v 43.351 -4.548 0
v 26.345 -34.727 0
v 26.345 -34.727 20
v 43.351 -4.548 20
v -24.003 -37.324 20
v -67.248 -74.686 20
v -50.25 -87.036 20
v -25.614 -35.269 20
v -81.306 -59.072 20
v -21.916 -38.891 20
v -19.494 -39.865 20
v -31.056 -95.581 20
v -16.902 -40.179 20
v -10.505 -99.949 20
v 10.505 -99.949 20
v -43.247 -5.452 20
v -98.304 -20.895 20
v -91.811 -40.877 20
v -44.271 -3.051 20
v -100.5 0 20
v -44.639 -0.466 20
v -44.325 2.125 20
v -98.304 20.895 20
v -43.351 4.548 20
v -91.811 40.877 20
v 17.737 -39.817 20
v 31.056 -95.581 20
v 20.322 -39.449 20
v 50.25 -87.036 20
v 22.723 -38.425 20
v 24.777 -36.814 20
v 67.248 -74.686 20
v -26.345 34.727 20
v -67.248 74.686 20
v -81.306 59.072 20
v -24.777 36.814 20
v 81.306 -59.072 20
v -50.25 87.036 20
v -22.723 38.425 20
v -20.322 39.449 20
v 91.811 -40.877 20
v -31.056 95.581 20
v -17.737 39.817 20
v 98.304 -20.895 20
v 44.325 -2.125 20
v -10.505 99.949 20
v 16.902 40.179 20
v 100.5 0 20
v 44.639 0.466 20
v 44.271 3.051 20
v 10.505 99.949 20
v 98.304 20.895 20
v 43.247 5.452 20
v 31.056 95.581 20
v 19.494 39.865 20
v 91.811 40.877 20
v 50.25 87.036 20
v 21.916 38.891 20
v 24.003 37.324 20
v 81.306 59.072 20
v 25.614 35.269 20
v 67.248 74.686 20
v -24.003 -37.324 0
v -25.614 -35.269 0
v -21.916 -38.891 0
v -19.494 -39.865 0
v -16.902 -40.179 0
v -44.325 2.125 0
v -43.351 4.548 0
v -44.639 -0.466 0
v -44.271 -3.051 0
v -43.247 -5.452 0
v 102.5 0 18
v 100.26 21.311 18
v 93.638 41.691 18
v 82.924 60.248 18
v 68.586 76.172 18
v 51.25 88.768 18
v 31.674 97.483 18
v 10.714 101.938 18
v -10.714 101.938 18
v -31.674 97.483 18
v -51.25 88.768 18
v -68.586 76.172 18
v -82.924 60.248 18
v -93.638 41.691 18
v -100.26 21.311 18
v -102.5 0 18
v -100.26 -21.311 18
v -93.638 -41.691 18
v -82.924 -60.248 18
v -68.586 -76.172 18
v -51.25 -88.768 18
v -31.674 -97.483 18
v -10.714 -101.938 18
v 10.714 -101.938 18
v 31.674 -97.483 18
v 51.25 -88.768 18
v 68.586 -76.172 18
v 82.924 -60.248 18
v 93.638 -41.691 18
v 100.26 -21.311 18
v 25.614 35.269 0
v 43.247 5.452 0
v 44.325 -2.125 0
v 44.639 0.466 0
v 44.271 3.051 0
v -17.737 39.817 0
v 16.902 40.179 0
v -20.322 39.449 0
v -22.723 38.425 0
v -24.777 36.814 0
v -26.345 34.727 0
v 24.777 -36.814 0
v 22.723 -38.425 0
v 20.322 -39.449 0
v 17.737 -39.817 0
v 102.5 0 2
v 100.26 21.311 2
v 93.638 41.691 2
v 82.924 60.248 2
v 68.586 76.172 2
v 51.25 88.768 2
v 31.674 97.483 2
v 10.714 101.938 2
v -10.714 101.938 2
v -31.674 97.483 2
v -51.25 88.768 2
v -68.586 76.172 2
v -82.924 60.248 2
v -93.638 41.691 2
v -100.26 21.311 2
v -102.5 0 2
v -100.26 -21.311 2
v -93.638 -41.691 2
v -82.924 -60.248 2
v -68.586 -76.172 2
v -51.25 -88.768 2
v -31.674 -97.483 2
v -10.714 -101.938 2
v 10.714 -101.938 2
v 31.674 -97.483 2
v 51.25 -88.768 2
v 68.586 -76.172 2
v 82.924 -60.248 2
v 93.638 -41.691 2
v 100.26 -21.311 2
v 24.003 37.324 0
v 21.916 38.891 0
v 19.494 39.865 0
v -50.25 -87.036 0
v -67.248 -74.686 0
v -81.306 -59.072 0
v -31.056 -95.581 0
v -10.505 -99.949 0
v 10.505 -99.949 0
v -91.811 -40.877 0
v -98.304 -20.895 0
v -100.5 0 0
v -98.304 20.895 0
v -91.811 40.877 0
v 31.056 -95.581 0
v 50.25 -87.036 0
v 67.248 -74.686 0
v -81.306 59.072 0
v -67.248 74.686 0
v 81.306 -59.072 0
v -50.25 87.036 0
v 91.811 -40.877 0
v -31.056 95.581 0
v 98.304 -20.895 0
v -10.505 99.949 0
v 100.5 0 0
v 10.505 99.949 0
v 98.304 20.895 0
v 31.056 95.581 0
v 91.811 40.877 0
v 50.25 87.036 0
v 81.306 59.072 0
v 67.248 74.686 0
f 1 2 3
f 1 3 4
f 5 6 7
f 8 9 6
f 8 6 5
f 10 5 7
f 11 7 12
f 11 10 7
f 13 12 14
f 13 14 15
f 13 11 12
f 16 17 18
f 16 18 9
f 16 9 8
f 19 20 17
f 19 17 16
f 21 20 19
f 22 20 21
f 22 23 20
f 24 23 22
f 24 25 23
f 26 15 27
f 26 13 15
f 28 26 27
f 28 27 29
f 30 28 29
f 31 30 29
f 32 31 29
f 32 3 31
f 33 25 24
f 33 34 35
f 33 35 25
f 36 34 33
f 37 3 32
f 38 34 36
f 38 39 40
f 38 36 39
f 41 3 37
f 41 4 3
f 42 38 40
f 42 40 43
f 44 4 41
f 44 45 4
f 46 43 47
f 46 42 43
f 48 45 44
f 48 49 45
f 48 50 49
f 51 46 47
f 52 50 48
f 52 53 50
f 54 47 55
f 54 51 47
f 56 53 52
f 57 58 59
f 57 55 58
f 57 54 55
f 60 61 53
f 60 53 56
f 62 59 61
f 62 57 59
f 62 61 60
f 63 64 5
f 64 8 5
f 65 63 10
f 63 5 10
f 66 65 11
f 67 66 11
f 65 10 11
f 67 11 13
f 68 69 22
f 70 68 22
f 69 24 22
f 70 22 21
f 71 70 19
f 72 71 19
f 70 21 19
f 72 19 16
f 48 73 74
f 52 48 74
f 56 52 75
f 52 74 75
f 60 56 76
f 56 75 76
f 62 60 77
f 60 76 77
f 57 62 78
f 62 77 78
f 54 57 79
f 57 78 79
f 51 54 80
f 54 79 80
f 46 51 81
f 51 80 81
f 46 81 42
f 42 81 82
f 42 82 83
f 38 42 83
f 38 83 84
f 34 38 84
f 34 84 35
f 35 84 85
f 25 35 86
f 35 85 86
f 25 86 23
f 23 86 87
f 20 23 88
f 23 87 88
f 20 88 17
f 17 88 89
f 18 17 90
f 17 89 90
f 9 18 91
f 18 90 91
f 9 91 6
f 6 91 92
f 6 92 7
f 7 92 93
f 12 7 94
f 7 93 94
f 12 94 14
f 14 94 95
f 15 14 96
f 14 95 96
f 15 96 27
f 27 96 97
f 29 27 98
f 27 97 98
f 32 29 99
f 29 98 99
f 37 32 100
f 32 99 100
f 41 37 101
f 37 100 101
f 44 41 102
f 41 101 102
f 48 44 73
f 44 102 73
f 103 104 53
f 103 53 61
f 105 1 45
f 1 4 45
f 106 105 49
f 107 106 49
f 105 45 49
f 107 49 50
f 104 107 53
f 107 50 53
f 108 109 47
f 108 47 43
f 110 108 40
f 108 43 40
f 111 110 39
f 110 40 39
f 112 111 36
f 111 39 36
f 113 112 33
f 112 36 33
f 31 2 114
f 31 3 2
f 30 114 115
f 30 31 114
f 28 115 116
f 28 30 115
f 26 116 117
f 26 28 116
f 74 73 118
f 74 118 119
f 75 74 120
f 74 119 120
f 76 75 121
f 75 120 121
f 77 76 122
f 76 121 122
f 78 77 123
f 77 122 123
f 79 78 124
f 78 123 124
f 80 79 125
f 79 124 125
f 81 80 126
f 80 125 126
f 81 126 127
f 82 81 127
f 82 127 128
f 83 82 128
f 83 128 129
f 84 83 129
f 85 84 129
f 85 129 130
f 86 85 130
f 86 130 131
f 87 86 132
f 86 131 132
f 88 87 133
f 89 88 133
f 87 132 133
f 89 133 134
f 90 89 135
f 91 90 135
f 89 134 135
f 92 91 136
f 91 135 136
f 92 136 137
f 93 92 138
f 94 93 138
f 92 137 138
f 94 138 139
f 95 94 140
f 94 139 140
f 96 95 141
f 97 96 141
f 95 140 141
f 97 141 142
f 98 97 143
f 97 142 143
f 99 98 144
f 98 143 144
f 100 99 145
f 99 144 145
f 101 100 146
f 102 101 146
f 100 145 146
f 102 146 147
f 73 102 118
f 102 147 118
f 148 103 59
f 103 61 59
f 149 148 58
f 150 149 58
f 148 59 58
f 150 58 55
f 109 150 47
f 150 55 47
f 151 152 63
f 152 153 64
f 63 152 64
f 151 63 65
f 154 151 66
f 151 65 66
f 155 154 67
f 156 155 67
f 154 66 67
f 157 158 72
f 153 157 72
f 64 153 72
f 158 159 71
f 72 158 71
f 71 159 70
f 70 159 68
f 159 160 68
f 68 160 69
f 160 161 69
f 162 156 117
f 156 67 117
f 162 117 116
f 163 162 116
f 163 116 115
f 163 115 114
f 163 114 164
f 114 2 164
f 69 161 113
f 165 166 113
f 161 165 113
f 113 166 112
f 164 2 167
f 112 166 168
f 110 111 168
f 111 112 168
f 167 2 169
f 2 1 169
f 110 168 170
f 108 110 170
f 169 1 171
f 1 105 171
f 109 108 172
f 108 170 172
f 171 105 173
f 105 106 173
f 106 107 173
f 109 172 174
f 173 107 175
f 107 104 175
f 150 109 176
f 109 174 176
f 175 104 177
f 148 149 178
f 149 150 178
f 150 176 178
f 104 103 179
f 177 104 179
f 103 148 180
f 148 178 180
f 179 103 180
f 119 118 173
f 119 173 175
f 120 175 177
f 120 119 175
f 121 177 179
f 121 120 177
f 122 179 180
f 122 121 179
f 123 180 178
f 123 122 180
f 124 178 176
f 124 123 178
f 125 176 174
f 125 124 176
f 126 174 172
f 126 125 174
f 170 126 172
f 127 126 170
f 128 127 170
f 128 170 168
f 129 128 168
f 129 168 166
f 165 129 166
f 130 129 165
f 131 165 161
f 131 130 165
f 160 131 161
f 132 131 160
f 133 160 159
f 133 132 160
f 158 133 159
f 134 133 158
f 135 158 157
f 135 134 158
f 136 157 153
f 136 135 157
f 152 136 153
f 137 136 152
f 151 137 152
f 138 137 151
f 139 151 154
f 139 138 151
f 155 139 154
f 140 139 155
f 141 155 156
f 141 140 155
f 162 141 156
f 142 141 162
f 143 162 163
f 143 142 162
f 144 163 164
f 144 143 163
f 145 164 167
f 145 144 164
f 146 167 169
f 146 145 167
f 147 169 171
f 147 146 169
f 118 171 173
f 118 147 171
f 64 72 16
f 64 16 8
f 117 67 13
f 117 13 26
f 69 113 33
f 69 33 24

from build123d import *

# Parameters (mm, degrees)
SKETCH1_R           = 102.5
BOSS_EXTRUDE1_DEPTH = 20
FILLET1_R           = 10
CHAMFER1_SIZE       = 2


with BuildPart() as part:
    # Sketch1 → Boss-Extrude1 (new body)
    with BuildSketch(Plane.XY):
        Circle(SKETCH1_R)
        Polygon((23.510405521, -39.756687055), (46.18550372, 0.482264907), (22.6750982, 40.238951962), (-23.510405521, 39.756687055), (-46.18550372, -0.482264907), (-22.6750982, -40.238951962), align=None, mode=Mode.SUBTRACT)
    extrude(amount=BOSS_EXTRUDE1_DEPTH)

    # Fillet1
    fillet1_edges = [part.edges().sort_by_distance(p)[0] for p in [
        (23.510405521, -39.756687055, 10),
        (46.18550372, 0.482264907, 10),
        (22.6750982, 40.238951962, 10),
        (-23.510405521, 39.756687055, 10),
        (-46.18550372, -0.482264907, 10),
        (-22.6750982, -40.238951962, 10),
    ]]
    fillet(fillet1_edges, radius=FILLET1_R)

    # Chamfer1
    chamfer1_edges = [part.edges().sort_by_distance(p)[0] for p in [
        (-102.5, 0, 0),
        (-102.5, 0, 20),
    ]]
    chamfer(chamfer1_edges, length=CHAMFER1_SIZE)


solid = part.part
